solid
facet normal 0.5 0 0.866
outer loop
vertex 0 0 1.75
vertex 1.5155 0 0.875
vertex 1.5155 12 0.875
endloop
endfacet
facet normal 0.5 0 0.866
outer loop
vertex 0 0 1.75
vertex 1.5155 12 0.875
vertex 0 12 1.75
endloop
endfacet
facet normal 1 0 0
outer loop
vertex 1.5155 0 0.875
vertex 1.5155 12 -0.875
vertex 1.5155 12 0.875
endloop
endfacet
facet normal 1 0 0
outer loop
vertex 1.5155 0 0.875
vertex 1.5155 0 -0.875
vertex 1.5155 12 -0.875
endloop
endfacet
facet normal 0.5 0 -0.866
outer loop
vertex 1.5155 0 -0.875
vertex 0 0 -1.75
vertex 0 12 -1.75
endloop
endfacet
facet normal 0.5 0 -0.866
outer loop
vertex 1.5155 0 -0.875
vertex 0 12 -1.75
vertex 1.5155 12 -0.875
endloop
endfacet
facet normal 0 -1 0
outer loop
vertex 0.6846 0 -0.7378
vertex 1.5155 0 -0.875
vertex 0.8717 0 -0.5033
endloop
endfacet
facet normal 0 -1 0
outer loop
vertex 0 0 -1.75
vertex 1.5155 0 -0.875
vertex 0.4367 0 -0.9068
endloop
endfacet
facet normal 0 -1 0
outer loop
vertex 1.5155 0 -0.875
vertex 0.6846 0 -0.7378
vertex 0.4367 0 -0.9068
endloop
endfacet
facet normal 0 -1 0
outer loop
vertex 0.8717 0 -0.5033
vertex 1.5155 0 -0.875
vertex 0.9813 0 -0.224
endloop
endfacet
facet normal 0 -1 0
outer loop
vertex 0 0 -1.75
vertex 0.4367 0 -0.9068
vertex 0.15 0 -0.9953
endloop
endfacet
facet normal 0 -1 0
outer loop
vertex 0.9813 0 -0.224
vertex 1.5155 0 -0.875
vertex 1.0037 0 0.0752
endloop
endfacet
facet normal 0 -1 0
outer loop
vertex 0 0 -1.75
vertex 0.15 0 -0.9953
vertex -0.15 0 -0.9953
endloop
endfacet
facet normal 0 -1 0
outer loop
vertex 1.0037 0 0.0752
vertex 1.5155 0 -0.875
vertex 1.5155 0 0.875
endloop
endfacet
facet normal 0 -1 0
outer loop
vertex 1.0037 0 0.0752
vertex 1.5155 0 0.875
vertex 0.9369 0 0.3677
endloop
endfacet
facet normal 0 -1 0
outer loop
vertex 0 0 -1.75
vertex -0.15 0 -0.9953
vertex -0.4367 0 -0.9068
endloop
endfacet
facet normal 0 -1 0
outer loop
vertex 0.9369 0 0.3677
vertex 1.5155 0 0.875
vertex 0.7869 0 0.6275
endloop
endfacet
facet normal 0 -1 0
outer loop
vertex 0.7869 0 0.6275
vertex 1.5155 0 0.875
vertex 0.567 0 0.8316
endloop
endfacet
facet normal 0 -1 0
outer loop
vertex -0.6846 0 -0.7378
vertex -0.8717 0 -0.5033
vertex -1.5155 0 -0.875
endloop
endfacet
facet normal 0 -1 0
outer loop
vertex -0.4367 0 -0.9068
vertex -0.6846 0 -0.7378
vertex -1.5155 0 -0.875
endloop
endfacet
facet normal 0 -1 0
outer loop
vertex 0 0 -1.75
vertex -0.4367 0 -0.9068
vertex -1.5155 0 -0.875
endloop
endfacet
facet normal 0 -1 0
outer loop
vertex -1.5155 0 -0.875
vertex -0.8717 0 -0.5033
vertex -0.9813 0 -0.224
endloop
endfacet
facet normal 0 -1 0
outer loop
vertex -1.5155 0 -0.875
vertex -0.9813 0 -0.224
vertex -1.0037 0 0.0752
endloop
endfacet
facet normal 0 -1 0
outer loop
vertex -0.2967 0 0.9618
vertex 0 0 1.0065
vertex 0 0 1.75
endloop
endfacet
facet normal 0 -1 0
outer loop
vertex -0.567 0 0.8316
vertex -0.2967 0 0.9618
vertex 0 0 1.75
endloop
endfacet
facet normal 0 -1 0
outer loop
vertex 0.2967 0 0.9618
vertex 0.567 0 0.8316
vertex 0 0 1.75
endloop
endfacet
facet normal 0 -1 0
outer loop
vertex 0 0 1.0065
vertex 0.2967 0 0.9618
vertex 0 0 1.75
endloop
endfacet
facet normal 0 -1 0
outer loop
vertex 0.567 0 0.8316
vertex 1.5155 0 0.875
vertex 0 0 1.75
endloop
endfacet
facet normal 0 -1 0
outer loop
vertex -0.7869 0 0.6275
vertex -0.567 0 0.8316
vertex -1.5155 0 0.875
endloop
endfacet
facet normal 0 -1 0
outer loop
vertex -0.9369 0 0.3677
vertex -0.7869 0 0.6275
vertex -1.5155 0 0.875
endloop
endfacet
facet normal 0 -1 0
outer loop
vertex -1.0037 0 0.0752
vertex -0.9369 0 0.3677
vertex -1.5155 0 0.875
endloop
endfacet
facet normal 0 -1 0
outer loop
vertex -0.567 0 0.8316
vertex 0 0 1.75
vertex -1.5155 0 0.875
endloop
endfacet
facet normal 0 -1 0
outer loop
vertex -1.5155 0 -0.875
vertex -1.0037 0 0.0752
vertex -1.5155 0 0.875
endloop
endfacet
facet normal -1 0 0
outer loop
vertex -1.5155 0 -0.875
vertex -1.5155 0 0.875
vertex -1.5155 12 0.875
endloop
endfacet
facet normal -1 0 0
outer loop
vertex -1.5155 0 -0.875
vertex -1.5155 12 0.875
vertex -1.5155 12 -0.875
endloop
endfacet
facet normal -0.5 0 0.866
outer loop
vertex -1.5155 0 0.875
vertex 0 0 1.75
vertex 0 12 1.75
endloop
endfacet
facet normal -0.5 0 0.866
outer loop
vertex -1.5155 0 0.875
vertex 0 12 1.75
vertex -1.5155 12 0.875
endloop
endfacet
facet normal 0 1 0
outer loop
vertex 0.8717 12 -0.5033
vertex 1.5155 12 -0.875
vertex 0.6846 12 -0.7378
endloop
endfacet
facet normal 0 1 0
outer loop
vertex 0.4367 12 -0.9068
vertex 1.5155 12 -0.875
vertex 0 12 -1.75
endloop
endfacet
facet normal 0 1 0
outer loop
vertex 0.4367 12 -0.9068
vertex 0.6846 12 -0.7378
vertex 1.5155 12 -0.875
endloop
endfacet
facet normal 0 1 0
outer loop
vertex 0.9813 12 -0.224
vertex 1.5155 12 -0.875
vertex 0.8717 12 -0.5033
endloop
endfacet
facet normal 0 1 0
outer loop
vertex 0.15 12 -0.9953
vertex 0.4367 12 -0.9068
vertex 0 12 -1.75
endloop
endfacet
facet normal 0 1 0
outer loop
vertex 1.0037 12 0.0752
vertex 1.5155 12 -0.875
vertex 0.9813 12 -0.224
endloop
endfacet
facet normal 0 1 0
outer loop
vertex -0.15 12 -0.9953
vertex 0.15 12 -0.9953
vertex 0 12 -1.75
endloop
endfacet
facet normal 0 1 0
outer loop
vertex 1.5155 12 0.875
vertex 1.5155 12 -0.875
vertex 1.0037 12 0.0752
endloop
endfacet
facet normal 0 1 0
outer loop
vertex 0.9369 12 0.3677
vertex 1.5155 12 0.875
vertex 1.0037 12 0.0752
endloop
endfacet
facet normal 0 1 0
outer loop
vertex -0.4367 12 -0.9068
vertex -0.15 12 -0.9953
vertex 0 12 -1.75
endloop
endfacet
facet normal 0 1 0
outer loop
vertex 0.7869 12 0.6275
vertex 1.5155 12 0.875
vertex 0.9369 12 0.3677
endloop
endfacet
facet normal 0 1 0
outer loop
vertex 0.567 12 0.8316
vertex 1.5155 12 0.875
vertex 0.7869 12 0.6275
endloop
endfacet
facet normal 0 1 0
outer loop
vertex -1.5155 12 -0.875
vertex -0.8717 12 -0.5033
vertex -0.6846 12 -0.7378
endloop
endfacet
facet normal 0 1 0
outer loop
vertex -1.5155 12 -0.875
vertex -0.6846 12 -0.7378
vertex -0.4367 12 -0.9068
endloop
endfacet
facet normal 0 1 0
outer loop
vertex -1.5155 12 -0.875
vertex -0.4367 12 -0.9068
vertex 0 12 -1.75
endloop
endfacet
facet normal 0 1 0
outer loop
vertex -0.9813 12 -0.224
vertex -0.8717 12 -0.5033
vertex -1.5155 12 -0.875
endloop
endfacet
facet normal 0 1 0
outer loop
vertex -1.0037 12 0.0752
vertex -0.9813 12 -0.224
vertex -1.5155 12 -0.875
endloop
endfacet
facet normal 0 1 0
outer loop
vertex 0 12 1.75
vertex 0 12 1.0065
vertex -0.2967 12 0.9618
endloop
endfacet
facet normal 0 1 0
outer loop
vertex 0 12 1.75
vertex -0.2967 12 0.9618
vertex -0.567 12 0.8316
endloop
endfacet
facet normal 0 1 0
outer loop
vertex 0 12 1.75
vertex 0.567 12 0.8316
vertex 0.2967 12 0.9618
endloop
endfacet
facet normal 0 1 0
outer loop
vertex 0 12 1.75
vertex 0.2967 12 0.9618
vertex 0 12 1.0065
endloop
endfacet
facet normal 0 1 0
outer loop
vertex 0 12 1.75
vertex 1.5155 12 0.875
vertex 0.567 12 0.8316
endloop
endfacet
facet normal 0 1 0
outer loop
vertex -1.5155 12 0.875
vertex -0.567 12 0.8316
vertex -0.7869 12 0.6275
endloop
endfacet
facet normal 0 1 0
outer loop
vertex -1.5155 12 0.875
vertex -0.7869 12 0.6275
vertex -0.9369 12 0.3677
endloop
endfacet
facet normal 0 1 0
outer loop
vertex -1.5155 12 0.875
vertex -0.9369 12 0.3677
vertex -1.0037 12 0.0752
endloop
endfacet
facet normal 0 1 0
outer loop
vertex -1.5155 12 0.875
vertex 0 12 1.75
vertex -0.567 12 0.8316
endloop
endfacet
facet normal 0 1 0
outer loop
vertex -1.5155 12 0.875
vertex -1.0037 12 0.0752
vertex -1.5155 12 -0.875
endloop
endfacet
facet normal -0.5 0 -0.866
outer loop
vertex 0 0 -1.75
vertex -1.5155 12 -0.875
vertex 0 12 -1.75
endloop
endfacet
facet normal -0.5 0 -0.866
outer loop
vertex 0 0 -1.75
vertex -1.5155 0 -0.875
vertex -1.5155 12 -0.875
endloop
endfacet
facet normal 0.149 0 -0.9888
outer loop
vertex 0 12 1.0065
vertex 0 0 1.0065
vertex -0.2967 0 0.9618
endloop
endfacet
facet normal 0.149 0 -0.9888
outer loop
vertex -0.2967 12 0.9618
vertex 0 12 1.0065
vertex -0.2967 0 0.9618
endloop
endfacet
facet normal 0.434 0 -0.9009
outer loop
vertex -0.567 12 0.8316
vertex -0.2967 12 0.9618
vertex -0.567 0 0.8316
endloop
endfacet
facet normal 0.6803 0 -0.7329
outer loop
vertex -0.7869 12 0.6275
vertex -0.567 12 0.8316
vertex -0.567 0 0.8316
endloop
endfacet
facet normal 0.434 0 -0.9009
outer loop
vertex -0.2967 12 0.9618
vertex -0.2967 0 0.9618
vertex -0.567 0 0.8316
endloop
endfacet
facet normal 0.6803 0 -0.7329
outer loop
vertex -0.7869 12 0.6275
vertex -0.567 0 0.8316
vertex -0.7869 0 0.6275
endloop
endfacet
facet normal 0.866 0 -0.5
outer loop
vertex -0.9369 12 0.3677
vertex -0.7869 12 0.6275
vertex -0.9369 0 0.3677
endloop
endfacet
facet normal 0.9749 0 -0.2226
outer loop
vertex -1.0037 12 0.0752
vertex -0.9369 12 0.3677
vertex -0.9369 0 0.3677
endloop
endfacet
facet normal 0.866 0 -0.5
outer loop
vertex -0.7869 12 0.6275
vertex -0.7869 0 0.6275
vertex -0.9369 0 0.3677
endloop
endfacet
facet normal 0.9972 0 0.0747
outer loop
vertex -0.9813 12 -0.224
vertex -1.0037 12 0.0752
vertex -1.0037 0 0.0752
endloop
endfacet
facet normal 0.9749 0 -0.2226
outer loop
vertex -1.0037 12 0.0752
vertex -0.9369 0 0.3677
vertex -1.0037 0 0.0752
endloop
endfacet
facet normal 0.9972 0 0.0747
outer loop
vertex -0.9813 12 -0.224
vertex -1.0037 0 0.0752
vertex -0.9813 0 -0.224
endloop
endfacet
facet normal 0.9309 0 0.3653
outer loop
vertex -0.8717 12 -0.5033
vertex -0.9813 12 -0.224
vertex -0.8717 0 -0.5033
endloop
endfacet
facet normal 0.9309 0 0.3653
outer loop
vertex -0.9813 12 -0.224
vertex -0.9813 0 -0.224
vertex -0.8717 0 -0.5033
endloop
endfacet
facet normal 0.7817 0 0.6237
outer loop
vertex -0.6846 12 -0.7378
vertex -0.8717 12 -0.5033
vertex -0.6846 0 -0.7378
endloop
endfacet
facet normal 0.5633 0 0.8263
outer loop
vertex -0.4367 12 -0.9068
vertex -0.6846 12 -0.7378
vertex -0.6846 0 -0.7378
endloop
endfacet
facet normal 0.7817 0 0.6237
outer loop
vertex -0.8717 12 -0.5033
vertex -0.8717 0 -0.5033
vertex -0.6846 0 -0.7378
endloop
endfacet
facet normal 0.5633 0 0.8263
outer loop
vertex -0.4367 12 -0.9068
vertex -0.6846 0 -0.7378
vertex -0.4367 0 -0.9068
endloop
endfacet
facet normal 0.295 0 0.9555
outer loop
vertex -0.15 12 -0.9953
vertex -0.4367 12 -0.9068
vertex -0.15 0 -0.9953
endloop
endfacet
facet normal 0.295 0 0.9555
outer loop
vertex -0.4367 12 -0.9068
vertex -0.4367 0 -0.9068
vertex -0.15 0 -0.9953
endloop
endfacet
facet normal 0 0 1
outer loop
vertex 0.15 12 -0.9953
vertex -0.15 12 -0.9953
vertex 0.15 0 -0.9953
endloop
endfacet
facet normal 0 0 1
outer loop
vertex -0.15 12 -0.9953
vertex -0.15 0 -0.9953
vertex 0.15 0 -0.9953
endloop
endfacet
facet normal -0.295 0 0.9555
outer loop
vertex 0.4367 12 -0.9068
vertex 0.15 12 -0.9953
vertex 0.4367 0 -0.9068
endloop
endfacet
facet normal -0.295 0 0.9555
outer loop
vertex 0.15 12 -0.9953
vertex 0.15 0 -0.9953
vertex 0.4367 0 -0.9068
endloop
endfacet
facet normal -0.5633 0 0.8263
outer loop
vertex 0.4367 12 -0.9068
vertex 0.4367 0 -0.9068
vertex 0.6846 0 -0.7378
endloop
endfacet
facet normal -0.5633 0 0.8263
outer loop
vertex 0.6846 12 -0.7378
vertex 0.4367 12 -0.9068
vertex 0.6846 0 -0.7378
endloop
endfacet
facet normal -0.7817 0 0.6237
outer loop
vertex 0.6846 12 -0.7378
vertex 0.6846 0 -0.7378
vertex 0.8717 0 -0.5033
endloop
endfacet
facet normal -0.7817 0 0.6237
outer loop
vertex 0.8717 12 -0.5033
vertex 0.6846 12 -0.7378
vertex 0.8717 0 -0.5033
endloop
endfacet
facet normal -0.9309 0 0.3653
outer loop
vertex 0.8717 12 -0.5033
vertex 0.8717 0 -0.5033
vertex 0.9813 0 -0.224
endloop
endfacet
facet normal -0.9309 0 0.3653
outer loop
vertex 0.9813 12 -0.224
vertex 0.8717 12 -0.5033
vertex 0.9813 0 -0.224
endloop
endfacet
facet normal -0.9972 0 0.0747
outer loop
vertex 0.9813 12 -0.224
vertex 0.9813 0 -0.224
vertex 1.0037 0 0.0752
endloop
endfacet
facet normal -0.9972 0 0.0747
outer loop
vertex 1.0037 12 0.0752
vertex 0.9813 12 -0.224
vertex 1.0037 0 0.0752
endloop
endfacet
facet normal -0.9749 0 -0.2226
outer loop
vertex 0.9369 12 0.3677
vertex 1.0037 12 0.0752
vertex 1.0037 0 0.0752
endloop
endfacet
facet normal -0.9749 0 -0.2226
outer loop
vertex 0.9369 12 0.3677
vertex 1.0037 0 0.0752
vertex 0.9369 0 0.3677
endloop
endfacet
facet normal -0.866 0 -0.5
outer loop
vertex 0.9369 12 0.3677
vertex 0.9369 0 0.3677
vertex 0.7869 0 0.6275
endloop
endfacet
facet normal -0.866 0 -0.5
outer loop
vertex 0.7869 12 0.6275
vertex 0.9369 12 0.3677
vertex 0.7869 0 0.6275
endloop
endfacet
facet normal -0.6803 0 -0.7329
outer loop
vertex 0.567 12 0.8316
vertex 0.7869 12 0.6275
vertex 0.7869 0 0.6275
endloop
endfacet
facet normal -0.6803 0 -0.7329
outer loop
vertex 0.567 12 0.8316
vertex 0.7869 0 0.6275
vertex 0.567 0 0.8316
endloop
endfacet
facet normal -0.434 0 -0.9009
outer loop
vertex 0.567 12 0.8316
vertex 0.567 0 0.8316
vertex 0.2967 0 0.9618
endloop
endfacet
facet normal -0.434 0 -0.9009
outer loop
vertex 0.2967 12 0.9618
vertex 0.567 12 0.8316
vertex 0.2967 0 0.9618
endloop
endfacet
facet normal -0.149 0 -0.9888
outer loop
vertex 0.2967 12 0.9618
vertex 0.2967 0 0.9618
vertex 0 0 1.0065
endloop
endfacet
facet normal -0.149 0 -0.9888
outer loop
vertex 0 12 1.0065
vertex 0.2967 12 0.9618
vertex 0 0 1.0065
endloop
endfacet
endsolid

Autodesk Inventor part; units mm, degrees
ref_plane "YZ Plane" through (0, 0, 0) normal (1, 0, 0) x (0, 1, 0)
ref_plane "XZ Plane" through (0, 0, 0) normal (0, 1, 0) x (-1, 0, 0)
ref_plane "XY Plane" through (0, 0, 0) normal (0, 0, 1) x (1, 0, 0)
sketch "Sketch1" plane through (0, 0, 0) normal (0, 1, 0) x (-1, 0, 0)
  line L0 (1.5155, -0.875) -> (0, -1.75)
  line L1 (0, -1.75) -> (-1.5155, -0.875)
  line L2 (-1.5155, -0.875) -> (-1.5155, 0.875)
  line L3 (-1.5155, 0.875) -> (0, 1.75)
  line L4 (0, 1.75) -> (1.5155, 0.875)
  line L5 (1.5155, 0.875) -> (1.5155, -0.875)
  point P0 (0, 0)
  point P1 (0, 0)
  dimension "d0" = 1.75
extrude "Extrusion1" add sketch "Sketch1" along normal blind 12
sketch "Sketch2" plane through (0, 12, 0) normal (0, 1, 0) x (1, 0, 0)
  point P0 (0, 0)
  point P1 (0, 0)
hole "Hole1" at (0, 12, 0) direction (0, -1, 0) diameter 2.013 end through all thread size "M2.5x0.45" class "6H" standard "ANSI Metric M Profile"
sketch "Sketch3" plane through (0, 0, 0) normal (0, -1, 0) x (1, 0, 0)
  point P0 (-34.949, 34.34)
  point P1 (0, 0)
  point P2 (-40.6419, -41.3626)
  point P3 (-75.5909, -7.0226)
sketch "Sketch4" plane through (0, 12, 0) normal (0, 1, 0) x (1, 0, 0)
  point P0 (0, 0)
  point P1 (-34.949, -34.34)
  point P2 (-40.6419, 41.3626)
  point P3 (-75.5909, 7.0226)
properties part number "12mm_M2.5_standoff"
